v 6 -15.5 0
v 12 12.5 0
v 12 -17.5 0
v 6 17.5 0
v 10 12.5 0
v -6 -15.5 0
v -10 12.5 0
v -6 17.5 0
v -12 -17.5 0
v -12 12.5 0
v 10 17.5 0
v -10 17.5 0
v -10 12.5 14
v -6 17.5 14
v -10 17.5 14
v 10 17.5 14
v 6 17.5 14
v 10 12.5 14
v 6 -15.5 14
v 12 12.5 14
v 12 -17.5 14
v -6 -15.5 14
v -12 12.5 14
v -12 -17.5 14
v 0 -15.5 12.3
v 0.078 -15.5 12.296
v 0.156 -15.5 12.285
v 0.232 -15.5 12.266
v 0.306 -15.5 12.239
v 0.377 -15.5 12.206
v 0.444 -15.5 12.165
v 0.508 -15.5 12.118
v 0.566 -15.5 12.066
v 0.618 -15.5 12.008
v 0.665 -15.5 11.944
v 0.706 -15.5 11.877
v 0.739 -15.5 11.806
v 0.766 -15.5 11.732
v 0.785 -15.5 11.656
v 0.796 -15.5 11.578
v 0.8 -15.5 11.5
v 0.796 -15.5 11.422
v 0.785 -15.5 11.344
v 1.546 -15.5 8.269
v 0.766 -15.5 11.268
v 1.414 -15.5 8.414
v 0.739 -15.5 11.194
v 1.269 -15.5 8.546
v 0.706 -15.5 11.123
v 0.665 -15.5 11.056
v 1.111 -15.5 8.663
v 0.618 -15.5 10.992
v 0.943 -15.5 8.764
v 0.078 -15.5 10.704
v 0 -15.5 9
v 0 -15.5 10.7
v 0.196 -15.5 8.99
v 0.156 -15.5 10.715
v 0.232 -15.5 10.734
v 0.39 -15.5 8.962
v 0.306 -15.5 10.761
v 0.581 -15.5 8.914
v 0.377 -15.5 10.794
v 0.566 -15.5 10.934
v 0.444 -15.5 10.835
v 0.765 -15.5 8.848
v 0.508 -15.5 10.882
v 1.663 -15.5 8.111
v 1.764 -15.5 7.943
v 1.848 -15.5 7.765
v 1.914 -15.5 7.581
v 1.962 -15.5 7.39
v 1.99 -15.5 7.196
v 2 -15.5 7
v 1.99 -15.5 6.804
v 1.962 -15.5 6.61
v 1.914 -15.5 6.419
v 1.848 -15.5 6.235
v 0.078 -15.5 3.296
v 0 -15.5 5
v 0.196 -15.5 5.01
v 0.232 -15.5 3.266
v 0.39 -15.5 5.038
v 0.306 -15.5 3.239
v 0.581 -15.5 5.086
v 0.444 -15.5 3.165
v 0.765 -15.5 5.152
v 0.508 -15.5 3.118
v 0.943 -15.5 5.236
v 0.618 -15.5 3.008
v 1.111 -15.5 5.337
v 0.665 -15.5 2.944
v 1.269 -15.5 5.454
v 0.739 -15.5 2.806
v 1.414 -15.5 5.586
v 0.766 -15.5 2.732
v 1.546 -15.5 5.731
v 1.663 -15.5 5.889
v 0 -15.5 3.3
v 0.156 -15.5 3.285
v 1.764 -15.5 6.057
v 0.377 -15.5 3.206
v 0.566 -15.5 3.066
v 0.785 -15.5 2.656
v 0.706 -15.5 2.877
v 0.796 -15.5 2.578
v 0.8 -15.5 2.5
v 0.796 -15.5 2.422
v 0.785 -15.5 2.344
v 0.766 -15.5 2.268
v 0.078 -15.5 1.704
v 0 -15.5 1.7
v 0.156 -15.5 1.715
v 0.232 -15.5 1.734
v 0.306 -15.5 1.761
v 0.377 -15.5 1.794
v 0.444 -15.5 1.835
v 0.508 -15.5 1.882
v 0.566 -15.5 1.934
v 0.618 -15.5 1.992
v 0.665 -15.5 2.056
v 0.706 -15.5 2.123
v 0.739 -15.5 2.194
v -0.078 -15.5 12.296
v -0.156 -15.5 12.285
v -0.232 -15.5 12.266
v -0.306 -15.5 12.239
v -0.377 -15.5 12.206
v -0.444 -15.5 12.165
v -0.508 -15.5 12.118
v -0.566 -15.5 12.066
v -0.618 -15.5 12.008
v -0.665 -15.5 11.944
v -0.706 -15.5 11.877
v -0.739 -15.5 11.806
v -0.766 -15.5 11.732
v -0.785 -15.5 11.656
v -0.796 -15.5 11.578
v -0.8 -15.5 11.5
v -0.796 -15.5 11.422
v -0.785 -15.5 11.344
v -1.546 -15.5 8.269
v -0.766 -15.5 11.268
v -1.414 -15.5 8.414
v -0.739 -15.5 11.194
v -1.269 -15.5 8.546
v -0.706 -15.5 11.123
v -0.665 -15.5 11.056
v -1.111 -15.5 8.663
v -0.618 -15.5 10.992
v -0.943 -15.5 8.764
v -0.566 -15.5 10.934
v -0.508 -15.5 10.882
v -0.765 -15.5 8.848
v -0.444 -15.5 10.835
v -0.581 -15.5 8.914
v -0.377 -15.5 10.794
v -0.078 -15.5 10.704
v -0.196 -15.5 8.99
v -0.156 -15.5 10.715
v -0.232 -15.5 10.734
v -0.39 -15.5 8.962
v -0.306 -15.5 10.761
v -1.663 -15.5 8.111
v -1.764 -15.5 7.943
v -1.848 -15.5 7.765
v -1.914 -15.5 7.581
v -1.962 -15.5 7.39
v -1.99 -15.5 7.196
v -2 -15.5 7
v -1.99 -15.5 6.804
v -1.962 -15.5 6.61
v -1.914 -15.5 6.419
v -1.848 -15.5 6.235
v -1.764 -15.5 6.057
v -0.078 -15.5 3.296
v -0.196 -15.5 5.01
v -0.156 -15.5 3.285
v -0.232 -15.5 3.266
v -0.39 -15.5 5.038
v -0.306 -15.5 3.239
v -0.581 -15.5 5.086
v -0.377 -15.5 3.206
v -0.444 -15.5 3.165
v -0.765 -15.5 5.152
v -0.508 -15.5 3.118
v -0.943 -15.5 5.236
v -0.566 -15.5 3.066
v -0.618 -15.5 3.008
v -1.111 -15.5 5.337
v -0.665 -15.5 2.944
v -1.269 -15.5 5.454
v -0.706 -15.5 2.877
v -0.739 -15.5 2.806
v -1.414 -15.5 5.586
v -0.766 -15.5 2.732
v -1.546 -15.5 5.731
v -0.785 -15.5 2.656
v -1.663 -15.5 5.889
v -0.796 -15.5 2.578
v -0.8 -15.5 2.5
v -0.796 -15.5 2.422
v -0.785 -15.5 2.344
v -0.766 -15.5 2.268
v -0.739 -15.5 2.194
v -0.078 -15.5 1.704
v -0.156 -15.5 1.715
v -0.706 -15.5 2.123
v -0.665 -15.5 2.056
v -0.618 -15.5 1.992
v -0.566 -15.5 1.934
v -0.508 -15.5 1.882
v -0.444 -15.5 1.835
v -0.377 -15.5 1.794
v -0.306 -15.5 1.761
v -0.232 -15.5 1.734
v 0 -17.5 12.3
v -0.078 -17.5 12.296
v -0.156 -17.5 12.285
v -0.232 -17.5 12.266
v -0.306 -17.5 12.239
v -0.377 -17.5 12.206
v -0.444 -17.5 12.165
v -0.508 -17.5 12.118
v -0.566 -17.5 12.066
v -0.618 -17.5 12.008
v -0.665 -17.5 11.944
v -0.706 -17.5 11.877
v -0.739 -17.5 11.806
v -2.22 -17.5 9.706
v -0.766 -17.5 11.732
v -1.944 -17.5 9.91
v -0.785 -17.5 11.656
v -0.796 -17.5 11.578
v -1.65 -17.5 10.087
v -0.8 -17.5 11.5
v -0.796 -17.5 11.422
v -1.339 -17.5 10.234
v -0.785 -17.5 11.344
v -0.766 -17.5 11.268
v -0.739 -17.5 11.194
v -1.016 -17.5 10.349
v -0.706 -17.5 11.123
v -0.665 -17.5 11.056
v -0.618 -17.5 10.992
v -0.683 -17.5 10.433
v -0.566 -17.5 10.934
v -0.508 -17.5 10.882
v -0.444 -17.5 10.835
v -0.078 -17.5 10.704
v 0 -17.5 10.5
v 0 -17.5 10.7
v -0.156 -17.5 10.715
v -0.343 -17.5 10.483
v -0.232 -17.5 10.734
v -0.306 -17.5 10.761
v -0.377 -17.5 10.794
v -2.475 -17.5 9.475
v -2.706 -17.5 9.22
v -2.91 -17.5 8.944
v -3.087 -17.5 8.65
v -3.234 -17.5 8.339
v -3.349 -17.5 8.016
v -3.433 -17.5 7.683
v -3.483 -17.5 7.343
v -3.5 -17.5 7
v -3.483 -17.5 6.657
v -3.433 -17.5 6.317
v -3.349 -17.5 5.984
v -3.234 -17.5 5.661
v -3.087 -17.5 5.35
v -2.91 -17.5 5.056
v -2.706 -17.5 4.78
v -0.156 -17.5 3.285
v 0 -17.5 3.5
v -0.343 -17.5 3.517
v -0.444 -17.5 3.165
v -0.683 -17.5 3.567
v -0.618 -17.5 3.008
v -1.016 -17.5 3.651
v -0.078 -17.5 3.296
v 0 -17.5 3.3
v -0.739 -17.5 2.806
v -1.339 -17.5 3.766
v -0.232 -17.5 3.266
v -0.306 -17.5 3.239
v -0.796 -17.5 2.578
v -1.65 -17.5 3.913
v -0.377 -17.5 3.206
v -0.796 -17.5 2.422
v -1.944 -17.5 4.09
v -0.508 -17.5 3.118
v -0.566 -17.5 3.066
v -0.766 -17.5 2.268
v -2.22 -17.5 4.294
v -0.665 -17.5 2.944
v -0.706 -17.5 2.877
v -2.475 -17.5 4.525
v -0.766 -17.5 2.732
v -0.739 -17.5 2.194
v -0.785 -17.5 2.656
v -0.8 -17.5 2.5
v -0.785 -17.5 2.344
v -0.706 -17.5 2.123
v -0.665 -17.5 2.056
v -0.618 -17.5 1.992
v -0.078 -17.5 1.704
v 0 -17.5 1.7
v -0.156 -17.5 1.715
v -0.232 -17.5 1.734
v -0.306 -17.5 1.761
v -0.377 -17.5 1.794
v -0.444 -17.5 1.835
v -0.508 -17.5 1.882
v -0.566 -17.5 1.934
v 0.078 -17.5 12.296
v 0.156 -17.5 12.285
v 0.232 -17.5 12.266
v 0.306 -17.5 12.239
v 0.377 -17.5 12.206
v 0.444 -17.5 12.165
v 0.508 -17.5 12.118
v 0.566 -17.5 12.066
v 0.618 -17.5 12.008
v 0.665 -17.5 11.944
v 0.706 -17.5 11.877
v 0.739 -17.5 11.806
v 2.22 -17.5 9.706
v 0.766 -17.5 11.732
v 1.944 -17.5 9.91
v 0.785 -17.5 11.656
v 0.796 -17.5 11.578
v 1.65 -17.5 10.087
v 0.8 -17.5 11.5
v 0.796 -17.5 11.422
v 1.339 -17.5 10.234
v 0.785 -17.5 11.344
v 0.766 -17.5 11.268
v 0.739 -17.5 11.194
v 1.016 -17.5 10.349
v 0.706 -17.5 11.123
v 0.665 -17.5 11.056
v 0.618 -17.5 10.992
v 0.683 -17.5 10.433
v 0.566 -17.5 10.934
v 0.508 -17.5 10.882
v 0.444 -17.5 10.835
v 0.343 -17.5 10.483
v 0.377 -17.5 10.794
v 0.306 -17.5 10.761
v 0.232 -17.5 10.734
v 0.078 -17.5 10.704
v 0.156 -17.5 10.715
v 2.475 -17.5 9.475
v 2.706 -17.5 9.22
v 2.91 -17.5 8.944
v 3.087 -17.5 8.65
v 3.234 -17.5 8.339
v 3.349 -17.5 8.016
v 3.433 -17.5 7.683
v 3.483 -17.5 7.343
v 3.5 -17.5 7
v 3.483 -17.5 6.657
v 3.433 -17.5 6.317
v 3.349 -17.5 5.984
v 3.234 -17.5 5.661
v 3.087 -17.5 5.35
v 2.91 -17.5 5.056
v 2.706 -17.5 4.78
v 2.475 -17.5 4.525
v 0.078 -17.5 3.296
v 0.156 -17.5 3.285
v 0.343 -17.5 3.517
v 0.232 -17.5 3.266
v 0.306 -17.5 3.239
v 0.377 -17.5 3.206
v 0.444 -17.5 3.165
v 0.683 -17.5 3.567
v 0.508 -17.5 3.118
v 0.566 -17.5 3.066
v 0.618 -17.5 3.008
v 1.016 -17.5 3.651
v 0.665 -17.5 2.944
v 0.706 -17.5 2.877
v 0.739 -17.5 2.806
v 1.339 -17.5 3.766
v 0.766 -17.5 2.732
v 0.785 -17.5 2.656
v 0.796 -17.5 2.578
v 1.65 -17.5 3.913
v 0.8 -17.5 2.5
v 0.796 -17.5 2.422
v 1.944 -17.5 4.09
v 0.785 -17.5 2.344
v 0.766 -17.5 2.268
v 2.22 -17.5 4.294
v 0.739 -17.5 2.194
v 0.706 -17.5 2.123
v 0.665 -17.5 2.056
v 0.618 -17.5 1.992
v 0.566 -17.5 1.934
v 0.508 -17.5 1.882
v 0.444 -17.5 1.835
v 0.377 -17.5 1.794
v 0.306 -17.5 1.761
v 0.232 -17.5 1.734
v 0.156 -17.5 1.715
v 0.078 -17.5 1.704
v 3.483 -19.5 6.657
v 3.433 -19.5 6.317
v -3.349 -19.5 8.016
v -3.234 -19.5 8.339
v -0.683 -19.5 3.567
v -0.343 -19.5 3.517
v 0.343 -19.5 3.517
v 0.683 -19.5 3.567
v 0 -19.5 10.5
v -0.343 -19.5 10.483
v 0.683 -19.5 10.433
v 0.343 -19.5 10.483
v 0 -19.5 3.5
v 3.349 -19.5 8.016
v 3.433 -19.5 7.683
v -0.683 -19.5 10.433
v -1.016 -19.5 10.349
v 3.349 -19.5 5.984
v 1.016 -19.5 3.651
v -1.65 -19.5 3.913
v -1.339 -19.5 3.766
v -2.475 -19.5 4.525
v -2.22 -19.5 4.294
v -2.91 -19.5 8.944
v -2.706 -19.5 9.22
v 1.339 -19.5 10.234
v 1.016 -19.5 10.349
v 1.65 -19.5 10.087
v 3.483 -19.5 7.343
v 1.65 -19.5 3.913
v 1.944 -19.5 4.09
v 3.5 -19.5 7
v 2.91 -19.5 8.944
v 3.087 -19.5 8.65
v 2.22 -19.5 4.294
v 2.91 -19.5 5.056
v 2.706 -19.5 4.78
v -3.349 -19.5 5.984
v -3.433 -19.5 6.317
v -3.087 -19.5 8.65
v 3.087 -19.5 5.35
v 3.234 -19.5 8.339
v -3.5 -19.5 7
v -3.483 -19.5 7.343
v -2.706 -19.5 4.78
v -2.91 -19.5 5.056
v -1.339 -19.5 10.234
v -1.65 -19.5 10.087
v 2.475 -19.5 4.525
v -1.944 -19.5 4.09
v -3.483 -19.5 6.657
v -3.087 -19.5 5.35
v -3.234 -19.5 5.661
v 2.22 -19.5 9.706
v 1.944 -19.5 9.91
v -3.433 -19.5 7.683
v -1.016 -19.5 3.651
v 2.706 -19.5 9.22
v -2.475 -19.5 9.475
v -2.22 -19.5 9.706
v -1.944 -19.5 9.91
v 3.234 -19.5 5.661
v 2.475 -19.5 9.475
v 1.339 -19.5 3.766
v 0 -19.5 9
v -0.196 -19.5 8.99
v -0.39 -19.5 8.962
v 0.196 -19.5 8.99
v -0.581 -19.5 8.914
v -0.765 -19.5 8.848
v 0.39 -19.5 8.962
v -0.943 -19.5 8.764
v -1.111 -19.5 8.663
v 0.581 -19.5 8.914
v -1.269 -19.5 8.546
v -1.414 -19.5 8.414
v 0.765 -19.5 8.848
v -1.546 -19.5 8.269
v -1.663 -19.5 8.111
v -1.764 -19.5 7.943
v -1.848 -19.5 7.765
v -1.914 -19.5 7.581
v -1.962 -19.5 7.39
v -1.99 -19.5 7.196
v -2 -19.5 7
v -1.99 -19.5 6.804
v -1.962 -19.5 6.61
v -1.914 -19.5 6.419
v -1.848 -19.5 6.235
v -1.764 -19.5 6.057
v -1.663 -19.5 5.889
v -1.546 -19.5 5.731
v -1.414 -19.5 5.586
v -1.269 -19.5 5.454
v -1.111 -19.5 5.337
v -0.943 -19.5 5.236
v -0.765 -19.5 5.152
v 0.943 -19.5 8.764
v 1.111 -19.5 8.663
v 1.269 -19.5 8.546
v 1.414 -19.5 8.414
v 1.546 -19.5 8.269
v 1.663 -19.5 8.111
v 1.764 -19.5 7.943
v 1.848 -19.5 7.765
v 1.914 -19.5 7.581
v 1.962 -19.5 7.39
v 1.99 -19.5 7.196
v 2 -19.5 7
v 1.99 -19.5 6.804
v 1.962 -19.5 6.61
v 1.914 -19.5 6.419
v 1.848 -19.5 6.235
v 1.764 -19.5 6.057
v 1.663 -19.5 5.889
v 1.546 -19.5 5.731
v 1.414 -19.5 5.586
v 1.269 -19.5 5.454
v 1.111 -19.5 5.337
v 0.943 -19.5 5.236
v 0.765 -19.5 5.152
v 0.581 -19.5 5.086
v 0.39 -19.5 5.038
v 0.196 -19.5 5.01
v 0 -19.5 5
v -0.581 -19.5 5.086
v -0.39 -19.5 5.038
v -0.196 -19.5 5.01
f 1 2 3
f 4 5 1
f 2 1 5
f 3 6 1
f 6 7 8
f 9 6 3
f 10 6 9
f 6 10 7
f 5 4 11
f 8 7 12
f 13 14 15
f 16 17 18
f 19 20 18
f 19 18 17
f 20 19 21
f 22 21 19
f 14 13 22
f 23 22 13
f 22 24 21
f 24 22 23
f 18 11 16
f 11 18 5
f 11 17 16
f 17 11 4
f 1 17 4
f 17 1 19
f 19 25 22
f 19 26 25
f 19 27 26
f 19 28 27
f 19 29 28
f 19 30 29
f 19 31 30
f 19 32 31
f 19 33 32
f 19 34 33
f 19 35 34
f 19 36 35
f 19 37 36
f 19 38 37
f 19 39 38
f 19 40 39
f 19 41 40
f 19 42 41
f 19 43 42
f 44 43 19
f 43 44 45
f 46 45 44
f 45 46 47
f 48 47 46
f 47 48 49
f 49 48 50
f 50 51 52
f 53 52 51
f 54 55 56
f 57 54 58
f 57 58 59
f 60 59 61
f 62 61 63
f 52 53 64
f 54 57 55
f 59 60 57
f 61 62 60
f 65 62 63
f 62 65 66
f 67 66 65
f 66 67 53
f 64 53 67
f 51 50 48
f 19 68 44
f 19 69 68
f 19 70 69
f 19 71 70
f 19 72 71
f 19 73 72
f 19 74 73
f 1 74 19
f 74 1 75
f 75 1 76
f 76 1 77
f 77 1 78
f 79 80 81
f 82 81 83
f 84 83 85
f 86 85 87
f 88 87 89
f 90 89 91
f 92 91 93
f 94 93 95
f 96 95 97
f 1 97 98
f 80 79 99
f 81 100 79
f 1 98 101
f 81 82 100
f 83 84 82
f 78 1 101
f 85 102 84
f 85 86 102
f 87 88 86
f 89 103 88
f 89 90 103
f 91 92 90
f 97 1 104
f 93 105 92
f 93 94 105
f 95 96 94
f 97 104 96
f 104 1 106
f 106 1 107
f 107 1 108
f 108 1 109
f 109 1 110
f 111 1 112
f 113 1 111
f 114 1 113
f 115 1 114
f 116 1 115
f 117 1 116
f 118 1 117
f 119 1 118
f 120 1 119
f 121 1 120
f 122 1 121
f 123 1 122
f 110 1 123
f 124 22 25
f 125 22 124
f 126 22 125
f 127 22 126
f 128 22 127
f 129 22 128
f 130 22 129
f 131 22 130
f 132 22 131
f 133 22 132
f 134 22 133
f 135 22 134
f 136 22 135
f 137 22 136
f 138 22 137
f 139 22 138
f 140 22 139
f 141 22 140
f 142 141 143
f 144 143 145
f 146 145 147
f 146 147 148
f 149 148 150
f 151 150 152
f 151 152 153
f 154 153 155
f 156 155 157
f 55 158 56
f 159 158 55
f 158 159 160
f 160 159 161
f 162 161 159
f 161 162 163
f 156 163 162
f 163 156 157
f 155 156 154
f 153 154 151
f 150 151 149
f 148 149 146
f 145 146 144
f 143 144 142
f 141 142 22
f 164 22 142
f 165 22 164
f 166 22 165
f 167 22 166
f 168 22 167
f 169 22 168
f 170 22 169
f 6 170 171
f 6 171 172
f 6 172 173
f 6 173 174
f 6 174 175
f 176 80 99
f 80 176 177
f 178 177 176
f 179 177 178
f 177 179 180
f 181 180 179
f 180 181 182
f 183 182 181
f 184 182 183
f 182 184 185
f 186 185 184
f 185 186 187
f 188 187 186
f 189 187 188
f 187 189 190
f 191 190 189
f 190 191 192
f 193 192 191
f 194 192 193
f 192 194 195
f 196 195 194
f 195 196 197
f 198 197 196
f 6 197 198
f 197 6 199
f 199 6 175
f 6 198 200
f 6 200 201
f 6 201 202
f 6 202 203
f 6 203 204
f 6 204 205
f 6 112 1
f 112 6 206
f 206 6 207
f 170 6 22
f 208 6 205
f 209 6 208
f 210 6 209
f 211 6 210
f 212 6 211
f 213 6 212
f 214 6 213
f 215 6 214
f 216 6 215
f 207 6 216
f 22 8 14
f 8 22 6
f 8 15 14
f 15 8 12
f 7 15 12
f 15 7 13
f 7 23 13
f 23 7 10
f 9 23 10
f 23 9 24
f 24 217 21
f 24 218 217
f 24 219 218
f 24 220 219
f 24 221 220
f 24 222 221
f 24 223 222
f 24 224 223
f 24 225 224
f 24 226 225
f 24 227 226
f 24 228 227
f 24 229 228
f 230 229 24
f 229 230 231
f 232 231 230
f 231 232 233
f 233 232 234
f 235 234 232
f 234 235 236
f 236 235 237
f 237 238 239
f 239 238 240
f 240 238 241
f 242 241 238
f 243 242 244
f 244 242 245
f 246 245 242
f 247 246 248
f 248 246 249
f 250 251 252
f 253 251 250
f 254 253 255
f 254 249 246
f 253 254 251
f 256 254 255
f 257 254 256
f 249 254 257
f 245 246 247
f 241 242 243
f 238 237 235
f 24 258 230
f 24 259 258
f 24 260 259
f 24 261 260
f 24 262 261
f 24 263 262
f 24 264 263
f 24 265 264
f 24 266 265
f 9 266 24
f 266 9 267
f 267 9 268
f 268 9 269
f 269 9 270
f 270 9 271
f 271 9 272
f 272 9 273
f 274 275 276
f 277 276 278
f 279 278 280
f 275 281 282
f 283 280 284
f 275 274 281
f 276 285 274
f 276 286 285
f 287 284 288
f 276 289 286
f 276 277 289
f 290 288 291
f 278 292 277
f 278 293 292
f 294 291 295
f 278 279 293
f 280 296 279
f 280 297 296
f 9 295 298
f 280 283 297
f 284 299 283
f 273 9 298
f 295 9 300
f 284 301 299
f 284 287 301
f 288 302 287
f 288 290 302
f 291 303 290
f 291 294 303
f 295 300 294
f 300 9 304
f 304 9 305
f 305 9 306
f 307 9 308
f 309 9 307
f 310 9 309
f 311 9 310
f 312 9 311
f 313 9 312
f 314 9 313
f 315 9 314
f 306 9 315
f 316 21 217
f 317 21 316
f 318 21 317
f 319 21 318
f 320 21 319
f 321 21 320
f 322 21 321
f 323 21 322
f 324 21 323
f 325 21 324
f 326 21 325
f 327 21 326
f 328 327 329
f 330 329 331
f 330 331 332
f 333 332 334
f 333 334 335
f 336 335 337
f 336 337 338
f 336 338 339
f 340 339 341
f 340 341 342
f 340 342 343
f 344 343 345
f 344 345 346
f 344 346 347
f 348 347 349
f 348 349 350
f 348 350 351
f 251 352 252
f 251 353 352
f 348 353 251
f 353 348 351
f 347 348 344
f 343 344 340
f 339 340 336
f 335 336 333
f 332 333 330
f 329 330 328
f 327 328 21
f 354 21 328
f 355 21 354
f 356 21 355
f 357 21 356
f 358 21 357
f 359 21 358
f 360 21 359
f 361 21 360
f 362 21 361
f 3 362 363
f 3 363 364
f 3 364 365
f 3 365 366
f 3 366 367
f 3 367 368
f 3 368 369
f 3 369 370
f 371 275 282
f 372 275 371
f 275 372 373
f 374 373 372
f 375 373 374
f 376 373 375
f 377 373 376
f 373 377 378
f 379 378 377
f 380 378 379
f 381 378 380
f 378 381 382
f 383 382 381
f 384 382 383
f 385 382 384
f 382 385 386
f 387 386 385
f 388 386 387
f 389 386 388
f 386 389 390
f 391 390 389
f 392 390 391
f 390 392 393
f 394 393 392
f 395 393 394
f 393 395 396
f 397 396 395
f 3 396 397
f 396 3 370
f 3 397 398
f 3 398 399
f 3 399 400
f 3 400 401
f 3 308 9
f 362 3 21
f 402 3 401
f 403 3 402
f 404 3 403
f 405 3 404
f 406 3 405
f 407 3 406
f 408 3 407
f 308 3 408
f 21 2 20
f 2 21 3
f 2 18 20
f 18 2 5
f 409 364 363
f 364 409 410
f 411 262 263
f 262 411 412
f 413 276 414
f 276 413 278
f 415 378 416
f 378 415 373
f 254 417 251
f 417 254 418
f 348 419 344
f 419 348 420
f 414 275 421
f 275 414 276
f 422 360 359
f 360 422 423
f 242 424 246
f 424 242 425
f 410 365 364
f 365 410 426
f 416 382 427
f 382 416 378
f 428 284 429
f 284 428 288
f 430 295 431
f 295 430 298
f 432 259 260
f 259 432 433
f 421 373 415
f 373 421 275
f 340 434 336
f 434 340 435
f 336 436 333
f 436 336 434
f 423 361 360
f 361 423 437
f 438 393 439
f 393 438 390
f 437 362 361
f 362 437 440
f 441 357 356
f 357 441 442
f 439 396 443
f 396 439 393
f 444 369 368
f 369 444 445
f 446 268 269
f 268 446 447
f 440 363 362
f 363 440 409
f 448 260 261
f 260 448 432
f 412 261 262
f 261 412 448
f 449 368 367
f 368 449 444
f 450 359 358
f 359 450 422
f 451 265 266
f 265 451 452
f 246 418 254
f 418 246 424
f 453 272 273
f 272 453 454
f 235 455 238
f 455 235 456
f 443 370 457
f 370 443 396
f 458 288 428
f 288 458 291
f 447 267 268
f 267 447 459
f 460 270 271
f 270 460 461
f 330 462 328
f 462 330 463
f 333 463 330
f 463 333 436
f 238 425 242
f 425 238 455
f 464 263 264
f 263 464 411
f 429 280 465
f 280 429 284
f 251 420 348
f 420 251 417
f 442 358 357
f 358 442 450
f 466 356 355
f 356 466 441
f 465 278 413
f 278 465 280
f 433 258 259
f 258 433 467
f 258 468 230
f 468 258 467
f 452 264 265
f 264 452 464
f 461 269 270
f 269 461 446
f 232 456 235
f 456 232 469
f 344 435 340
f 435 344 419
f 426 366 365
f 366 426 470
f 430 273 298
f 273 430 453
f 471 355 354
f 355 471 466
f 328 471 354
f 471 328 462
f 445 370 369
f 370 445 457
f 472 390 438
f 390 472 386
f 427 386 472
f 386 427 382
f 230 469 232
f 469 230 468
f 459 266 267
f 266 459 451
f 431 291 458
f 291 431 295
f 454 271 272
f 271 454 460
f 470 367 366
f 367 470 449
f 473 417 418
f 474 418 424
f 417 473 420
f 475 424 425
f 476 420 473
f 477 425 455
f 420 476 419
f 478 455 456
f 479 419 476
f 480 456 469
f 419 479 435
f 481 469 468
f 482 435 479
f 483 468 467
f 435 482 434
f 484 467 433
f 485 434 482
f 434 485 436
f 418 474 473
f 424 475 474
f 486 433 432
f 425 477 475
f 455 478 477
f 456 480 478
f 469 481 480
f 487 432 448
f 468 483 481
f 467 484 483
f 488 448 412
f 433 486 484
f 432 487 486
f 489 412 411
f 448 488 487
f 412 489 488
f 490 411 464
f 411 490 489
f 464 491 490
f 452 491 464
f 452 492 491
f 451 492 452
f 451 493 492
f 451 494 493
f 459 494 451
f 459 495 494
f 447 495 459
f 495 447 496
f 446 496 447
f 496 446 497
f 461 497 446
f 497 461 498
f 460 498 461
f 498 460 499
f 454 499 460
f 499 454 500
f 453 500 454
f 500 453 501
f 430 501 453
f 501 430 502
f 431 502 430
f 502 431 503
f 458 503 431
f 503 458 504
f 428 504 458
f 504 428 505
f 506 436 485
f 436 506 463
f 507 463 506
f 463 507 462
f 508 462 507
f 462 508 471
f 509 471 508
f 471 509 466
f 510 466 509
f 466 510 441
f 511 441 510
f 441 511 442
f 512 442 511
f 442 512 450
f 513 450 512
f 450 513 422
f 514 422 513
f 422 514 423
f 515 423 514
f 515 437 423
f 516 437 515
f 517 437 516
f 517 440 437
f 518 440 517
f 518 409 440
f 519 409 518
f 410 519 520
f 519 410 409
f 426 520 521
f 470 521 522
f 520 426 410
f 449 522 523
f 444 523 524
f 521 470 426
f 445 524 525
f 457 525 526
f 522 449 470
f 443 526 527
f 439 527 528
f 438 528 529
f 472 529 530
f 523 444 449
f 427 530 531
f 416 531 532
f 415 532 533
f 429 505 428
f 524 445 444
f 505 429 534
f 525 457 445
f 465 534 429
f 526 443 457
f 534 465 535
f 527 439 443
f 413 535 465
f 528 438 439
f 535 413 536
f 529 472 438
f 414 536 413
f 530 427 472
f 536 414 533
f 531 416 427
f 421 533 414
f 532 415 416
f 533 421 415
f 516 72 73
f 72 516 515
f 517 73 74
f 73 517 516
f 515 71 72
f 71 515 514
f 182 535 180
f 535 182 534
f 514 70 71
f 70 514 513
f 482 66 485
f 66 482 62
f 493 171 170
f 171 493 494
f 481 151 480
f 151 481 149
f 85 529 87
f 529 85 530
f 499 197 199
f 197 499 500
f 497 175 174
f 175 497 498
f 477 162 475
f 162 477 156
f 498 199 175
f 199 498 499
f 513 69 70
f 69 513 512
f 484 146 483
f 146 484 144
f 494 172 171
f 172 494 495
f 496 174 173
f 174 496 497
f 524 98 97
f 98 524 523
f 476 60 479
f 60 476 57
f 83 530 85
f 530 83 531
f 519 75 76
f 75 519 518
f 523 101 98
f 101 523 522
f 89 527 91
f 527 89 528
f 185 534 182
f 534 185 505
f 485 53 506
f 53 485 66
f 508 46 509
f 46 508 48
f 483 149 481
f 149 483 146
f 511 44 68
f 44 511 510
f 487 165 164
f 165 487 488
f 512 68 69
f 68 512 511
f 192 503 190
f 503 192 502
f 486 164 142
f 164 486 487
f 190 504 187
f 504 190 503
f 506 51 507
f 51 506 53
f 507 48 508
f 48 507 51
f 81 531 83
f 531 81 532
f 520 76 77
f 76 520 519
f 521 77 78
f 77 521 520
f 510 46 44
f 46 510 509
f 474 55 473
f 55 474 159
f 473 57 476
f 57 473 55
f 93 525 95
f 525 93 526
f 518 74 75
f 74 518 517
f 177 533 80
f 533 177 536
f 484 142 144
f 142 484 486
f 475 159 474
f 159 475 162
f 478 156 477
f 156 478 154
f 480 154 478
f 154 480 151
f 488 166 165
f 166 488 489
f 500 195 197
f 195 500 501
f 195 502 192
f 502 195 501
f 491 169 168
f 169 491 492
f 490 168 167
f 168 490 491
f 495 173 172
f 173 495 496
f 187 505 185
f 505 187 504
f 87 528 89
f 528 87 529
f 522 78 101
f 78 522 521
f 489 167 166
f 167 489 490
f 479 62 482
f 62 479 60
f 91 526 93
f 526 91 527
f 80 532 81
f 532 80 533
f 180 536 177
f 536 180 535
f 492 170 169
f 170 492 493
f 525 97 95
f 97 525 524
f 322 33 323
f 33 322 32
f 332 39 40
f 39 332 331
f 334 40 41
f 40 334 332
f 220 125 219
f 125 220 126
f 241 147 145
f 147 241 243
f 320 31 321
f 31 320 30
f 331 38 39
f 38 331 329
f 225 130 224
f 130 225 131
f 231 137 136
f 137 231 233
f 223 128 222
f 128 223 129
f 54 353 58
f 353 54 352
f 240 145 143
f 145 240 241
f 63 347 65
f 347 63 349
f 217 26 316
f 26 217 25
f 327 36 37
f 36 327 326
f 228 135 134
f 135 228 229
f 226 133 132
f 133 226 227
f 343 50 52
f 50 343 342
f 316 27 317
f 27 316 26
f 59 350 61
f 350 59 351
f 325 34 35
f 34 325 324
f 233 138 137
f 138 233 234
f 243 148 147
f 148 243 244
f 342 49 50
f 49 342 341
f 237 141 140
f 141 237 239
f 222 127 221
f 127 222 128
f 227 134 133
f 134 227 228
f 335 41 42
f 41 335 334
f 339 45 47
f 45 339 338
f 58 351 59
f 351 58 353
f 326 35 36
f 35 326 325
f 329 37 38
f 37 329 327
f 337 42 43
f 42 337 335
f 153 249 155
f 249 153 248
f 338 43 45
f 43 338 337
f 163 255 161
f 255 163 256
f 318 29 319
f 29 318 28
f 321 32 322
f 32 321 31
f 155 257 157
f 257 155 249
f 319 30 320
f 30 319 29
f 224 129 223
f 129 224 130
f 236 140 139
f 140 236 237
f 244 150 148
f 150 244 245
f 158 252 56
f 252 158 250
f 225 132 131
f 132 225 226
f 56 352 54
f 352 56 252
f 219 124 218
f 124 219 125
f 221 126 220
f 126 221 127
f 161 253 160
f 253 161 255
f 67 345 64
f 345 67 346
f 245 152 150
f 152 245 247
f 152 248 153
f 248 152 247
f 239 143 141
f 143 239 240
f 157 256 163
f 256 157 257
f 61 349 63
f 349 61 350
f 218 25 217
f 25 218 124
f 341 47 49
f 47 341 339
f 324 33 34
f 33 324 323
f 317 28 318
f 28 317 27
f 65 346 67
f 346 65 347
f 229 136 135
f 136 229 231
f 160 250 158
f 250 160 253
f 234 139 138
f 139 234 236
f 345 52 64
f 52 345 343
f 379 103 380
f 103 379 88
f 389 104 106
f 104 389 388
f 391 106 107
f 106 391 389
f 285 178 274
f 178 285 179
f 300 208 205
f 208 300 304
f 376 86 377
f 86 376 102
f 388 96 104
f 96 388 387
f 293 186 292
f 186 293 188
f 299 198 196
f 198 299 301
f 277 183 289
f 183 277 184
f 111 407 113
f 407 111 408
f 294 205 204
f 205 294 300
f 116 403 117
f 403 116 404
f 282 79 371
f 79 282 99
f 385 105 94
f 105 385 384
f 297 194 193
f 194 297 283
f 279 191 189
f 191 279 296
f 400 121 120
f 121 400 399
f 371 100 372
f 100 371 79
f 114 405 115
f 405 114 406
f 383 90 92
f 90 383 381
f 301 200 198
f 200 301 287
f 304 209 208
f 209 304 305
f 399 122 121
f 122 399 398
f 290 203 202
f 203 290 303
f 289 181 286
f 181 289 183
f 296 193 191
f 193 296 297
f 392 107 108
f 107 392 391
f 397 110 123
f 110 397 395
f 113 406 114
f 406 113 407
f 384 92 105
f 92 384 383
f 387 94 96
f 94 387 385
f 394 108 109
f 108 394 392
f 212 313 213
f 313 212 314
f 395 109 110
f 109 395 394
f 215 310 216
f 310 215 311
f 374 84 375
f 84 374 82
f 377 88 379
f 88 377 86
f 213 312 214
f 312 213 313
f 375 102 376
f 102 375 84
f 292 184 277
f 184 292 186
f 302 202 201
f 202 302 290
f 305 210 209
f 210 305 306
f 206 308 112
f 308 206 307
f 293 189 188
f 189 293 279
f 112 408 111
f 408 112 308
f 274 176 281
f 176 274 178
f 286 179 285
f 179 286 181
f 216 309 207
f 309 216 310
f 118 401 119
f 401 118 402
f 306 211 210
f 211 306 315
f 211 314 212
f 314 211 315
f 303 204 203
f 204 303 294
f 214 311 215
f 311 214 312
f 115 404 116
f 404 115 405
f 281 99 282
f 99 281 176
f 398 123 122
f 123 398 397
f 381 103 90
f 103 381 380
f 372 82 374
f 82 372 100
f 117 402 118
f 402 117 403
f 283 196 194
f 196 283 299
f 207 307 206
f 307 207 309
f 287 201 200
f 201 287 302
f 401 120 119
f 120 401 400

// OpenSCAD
// todo: udelat prehledne

$fn = 64;

difference() {
union() {
    linear_extrude(14)
    difference() {
        square([24,35], true);
        union() {
            translate([0,2/2])
            square([24-2*6,35-2], true);
            translate([24/2-1,30/2])
            square([2,5], true);
            translate([-24/2+1,30/2])
            square([2,5], true);
        }
    }
    translate([0,-15.5,14/2])
    rotate([90,0,0])
    cylinder(2+2, d=7); 
}
union()
{
   translate([0,-15,14/2])
rotate([90,0,0])
cylinder(5, d=4); 

translate([0,-15,14/2+9/2])
rotate([90,0,0])
cylinder(5, d=1.6);

translate([0,-15,14/2-9/2])
rotate([90,0,0])
cylinder(5, d=1.6);    
}
}
